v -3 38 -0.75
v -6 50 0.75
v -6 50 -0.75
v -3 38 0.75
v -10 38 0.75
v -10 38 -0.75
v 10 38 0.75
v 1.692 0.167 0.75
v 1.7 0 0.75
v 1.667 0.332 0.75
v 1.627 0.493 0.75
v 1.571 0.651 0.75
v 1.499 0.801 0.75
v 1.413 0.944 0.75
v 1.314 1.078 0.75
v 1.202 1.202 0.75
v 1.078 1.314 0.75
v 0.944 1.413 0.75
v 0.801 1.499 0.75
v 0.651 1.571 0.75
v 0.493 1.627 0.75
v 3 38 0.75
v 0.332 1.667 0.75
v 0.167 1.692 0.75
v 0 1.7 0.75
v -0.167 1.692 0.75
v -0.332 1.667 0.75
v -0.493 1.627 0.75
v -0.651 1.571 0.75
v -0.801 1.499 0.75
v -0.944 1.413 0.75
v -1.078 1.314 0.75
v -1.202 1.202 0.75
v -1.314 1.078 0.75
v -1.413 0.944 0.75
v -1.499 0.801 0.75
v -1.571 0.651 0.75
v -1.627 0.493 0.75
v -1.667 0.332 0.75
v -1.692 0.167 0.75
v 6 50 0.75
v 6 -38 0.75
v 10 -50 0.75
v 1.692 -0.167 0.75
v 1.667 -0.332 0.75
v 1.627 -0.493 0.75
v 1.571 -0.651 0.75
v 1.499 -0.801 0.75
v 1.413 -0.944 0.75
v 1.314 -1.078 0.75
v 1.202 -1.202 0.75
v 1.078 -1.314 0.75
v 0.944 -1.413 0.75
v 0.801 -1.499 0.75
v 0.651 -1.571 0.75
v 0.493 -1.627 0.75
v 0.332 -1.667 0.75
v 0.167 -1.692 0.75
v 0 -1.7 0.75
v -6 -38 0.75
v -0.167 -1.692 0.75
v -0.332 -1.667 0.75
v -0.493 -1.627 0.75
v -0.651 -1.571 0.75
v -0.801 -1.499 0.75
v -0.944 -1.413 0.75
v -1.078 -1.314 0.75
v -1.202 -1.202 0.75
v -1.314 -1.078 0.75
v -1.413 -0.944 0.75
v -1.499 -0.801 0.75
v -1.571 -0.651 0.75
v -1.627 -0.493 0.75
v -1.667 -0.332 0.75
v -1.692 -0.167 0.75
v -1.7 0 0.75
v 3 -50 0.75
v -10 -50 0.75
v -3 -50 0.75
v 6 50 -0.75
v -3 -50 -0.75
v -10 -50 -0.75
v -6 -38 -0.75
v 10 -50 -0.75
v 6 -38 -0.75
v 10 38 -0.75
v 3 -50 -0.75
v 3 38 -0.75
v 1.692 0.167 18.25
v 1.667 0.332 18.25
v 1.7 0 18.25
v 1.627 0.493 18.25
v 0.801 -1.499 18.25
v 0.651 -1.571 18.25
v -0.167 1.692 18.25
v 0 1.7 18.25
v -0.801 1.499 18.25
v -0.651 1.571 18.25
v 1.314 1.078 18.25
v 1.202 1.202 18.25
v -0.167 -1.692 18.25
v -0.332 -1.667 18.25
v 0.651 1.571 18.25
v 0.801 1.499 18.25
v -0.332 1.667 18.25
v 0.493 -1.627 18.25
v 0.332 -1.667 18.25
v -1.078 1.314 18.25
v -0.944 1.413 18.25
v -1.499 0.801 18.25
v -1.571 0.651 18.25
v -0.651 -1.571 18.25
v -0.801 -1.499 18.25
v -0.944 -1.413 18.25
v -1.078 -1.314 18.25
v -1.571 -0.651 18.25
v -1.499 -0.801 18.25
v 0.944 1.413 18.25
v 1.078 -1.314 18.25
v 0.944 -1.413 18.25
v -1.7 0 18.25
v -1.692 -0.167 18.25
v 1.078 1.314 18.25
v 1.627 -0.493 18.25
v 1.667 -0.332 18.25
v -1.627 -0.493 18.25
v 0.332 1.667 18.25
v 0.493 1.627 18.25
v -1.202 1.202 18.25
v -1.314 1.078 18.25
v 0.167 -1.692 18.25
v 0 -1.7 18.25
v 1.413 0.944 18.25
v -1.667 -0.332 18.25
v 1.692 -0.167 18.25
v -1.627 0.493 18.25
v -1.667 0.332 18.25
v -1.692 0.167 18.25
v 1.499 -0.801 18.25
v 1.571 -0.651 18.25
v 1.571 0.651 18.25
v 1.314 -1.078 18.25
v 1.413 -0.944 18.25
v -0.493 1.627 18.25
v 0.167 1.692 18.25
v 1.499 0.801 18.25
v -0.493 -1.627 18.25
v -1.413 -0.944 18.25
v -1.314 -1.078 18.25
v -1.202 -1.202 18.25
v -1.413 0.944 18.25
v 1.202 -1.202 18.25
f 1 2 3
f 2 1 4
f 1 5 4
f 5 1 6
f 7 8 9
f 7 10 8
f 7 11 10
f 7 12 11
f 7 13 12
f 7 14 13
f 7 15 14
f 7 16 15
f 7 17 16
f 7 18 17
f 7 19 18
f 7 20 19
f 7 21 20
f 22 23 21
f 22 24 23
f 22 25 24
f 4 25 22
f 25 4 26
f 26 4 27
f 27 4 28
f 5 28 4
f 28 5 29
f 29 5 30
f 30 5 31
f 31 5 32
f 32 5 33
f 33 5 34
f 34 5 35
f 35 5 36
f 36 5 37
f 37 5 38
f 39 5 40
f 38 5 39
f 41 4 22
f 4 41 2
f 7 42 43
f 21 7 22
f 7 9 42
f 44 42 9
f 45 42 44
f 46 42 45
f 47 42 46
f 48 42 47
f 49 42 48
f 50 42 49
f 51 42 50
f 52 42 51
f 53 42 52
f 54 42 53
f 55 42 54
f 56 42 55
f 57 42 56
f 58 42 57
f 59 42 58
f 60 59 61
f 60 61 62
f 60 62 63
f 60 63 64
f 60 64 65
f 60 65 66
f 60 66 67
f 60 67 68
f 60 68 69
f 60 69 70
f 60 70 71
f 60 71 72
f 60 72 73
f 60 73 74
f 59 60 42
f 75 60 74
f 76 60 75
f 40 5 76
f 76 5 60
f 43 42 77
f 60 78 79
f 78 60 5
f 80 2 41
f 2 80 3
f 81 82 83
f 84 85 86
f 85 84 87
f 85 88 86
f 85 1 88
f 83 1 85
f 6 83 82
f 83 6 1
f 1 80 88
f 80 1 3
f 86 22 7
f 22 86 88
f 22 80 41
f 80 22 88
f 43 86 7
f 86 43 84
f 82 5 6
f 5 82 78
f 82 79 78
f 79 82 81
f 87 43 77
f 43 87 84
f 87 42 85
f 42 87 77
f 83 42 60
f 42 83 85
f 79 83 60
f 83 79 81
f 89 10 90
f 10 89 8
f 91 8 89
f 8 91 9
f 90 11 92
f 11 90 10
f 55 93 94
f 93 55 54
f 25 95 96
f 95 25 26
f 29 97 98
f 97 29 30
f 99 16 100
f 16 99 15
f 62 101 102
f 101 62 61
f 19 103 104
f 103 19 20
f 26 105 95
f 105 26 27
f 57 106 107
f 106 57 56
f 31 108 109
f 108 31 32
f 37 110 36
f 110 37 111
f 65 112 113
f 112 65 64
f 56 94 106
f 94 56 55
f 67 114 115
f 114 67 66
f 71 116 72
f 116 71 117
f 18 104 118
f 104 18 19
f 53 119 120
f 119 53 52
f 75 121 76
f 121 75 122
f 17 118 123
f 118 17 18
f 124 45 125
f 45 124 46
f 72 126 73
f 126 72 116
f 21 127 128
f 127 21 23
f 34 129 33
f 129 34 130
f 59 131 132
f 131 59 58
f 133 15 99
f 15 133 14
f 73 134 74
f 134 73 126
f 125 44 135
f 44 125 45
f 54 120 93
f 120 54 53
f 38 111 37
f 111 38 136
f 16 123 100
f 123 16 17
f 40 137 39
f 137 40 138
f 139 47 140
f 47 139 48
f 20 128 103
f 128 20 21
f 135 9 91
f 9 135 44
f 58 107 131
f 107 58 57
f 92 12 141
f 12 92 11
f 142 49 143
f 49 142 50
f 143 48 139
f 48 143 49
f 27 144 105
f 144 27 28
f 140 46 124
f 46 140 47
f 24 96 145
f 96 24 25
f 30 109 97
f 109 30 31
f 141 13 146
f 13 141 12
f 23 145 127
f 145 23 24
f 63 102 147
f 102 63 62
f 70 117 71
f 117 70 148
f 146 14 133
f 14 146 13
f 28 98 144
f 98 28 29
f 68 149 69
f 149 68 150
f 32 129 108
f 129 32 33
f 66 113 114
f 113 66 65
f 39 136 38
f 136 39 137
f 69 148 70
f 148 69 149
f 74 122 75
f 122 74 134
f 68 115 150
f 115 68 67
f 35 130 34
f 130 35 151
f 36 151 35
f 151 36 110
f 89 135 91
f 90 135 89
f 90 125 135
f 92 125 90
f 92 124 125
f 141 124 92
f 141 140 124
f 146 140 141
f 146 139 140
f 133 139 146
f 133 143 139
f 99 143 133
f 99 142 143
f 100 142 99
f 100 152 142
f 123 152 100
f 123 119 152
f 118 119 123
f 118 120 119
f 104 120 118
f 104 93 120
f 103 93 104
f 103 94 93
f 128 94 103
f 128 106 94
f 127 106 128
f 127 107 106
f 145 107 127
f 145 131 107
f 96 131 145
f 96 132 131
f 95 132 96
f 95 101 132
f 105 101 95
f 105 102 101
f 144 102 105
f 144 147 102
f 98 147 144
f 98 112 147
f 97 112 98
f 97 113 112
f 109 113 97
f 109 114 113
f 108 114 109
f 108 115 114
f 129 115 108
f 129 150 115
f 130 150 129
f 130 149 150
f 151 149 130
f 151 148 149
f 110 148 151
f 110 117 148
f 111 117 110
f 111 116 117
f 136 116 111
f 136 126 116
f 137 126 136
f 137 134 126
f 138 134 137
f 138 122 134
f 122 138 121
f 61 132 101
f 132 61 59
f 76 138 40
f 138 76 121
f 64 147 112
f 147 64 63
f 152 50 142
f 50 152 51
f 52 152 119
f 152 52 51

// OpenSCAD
base_length = 100;
base_width = 20;
base_height = 1.5;
dove_min = 6;
dove_max = 12;
dove_length = 12;
cylinder_diameter = 3.4;
cylinder_height = 17.5;

$fn= $preview ? 32 : 64;

module base() {
    cube(
        [base_width, base_length, base_height],
        center = true
    );
}

module dovetail() {
    color([0, 1, 0])
    linear_extrude(base_height)
    polygon([
        [-dove_min/2, -dove_length/2],
        [-dove_max/2, dove_length/2],
        [dove_max/2, dove_length/2],
        [dove_min/2, -dove_length/2]
    ]);
}

module inverse_dovetail() {
    color([1, 0, 0])
    linear_extrude(base_height)
    polygon([
        [-dove_min/2, -dove_length/2],
        [-dove_min/2-(base_width+dove_max)/2, -dove_length/2],
        [-dove_min/2-(base_width+dove_max)/2, dove_length/2],
        [-dove_max/2, dove_length/2]    
    ]);
    color([1, 0, 0])
    linear_extrude(base_height)
    polygon([
        [dove_min/2, -dove_length/2],
        [dove_min/2+(base_width+dove_max)/2, -dove_length/2],
        [dove_min/2+(base_width+dove_max)/2, dove_length/2],
        [dove_max/2, dove_length/2]    
    ]);
}

module go_to_dovetail_start() {
    translate([0, -base_length/2 + dove_length/2, -base_height/2])
    children(0);
}

module go_to_dovetail_end() {
    translate([0, base_length/2 - dove_length/2, -base_height/2])
    children(0);
}

union() {
    difference() {
        base();

        go_to_dovetail_start() {
            dovetail();
        }
        go_to_dovetail_end() {
            inverse_dovetail();        
        }
    }
    
    translate([0, 0, cylinder_height/2 + base_height/2])
    cylinder(h = cylinder_height, d = cylinder_diameter, center = true);
}
